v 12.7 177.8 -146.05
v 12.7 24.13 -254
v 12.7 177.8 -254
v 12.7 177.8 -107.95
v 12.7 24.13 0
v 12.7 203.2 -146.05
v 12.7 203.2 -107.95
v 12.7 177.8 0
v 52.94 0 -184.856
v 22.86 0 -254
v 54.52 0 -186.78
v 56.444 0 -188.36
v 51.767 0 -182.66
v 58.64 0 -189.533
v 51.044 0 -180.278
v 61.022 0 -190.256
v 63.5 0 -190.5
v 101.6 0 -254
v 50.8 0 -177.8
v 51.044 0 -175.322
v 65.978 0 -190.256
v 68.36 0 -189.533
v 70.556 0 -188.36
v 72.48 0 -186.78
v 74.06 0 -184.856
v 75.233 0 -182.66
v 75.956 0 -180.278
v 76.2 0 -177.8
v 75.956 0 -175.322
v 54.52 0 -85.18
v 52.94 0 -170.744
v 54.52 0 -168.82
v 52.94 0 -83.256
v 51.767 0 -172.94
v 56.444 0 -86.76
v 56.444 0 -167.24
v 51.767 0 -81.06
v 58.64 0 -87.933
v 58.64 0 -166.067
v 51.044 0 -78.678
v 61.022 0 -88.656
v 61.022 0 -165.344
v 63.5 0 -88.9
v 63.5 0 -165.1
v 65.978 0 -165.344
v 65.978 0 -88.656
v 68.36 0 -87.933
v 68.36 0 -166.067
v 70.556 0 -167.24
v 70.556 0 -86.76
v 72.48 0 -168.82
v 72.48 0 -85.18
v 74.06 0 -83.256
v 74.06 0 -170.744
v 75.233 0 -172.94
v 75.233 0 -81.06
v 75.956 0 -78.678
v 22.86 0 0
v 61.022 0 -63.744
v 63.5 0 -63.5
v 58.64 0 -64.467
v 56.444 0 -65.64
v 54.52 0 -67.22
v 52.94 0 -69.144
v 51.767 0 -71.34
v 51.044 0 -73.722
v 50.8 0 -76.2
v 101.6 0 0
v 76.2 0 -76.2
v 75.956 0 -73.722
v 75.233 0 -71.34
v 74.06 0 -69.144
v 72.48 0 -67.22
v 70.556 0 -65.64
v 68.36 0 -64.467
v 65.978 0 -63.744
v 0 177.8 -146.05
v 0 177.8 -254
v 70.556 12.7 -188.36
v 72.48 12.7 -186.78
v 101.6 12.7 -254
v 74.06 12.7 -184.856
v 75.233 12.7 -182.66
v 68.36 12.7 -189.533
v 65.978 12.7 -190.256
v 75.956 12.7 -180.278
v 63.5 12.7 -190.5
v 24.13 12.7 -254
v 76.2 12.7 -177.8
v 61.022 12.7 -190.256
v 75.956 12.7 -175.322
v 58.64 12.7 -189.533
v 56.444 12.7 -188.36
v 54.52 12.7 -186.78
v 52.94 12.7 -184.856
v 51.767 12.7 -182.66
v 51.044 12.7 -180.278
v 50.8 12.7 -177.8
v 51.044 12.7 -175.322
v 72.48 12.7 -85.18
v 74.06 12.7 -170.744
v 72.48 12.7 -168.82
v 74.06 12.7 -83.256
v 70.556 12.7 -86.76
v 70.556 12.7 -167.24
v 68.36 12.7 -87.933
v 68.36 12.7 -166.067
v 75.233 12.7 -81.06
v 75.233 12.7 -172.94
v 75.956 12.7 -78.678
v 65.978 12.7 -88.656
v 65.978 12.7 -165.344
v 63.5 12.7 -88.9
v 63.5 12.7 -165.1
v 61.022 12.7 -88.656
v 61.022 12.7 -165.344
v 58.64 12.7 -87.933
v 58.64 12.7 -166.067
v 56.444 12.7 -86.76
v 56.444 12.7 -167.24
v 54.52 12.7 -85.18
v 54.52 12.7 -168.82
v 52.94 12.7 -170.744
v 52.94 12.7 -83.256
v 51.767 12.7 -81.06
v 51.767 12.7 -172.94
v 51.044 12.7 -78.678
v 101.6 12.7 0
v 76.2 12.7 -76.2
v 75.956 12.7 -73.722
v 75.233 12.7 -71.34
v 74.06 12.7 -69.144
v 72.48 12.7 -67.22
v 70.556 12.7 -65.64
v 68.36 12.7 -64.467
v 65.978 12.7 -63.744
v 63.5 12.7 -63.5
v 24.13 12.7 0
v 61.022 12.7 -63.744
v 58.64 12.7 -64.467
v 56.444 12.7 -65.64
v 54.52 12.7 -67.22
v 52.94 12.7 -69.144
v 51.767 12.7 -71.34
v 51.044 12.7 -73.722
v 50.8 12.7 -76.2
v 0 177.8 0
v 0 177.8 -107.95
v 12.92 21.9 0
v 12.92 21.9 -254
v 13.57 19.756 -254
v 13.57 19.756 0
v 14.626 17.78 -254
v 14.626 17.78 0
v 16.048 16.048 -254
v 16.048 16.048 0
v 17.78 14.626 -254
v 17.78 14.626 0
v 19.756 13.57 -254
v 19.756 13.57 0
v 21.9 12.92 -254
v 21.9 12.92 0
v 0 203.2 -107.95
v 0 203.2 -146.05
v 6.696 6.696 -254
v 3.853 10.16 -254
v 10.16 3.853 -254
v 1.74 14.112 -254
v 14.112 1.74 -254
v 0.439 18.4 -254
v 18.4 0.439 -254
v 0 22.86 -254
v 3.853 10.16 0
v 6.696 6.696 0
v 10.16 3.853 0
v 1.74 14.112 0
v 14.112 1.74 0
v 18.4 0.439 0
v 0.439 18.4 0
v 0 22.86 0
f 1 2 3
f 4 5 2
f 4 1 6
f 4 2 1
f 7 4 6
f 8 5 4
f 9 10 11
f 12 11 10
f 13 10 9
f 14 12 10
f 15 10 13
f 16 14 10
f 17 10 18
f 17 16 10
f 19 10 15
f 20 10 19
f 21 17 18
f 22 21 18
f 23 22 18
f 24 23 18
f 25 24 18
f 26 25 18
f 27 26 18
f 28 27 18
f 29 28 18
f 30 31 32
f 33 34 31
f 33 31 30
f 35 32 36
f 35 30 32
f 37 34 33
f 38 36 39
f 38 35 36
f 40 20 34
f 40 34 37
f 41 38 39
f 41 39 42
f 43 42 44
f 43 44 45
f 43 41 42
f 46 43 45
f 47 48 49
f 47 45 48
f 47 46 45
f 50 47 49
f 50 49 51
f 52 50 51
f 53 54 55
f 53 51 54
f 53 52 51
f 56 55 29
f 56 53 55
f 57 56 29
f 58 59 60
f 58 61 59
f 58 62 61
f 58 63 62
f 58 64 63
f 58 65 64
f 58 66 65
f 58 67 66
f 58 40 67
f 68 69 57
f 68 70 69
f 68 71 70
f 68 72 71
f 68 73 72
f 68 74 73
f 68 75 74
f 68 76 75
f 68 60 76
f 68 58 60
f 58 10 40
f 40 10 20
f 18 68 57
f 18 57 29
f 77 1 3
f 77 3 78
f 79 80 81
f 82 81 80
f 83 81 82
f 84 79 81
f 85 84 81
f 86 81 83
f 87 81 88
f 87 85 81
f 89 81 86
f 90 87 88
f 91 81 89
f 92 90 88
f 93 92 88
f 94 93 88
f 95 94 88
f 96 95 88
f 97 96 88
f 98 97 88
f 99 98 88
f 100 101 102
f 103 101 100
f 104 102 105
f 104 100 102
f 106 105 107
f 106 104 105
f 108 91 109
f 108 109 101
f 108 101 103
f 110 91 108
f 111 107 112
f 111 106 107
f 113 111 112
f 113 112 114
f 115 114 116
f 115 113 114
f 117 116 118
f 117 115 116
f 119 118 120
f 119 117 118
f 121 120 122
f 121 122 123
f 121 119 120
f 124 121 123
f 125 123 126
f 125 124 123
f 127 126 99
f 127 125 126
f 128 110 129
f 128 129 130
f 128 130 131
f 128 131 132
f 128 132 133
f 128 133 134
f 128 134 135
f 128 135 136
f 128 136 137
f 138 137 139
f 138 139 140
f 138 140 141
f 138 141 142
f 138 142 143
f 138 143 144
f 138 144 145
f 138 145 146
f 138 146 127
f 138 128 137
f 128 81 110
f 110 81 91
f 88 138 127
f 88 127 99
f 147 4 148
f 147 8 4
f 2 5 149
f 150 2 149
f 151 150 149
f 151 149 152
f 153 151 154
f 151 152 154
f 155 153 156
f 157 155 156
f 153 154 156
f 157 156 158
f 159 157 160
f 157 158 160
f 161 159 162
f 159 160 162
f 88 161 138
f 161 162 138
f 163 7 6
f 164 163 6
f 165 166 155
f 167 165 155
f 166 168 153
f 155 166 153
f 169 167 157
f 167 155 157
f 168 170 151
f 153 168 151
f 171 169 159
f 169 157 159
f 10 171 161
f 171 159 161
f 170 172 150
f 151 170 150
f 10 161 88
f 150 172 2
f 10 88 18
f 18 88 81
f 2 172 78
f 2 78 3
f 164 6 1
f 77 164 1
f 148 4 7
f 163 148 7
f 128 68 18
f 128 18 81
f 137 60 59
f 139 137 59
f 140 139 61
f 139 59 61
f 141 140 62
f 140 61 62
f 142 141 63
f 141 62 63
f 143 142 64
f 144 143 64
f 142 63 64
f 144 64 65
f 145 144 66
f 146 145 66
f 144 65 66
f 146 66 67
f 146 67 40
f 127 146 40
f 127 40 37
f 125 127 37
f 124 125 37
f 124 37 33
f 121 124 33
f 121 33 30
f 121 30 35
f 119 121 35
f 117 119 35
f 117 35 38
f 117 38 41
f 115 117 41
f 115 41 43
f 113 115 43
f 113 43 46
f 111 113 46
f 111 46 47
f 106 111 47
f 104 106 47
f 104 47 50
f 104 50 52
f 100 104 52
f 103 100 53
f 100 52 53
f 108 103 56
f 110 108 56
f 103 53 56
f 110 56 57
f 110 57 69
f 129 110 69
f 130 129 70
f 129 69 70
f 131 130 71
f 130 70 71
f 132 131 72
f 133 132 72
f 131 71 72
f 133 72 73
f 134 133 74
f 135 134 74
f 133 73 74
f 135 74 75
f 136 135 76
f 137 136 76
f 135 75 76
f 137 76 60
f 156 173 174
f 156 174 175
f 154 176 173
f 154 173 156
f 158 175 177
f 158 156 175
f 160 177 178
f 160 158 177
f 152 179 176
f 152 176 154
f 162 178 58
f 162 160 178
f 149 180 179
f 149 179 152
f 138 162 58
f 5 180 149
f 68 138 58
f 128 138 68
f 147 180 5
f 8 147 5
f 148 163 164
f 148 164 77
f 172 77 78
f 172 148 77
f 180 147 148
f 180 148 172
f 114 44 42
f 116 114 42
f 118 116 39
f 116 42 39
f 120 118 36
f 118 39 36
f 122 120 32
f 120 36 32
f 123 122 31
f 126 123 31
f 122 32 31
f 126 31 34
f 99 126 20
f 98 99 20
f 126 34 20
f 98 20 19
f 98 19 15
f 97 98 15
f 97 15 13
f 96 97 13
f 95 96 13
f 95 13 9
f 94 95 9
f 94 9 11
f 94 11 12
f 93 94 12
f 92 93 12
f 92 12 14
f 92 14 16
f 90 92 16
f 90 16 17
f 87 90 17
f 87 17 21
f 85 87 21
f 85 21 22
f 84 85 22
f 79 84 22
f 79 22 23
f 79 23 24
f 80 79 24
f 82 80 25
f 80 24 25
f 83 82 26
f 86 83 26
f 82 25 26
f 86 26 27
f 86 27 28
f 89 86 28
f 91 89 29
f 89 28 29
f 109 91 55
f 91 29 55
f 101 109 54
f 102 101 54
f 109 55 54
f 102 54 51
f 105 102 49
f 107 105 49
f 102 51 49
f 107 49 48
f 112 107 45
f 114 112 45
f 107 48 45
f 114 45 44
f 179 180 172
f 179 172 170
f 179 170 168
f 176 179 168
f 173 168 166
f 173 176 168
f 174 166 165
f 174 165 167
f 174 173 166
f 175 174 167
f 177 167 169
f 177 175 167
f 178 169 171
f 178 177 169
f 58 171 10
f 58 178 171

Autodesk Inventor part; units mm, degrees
ref_plane "YZ Plane" through (0, 0, 0) normal (1, 0, 0) x (0, 1, 0)
ref_plane "XZ Plane" through (0, 0, 0) normal (0, 1, 0) x (-1, 0, 0)
ref_plane "XY Plane" through (0, 0, 0) normal (0, 0, 1) x (1, 0, 0)
sketch "Sketch1" plane through (0, 0, 0) normal (0, 0, 1) x (1, 0, 0)
  line L0 (0, 232.5603) -> (0, -22.9879) projected
  line L1 (-15.3679, 0) -> (133.5003, 0) projected
  line L2 (0, 177.8) -> (0, 22.86)
  line L3 (22.86, 0) -> (101.6, 0)
  line L4 (101.6, 0) -> (101.6, 12.7)
  line L5 (101.6, 12.7) -> (24.13, 12.7)
  line L6 (12.7, 24.13) -> (12.7, 177.8)
  line L7 (12.7, 177.8) -> (0, 177.8)
  arc A0 (0, 22.86) -> (22.86, 0) centre (22.86, 22.86) ccw
  arc A1 (12.7, 24.13) -> (24.13, 12.7) centre (24.13, 24.13) ccw
  dimension "d0" = 22.86
  dimension "d1" = 12.7
  dimension "d2" = 177.8
  dimension "d4" = 12.7
  dimension "d6" = 101.6
  dimension "d7" = 11.43
extrude "Extrusion1" add sketch "Sketch1" against normal blind 254 contours L7 L6 A1 L5 L4 L1 A0 L0
sketch "Sketch2" plane through (24.13, 12.7, 0) normal (0, 1, 0) x (1, 0, 0)
  line L0 (77.47, 0) -> (0, 0) projected
  line L1 (77.47, 0) -> (77.47, 254) projected
  point P0 (39.37, 76.2)
  dimension "d10" = 38.1
  dimension "d11" = 76.2
hole "Hole1" at (63.5, 12.7, -76.2) direction (0, -1, 0) diameter 25.4 end through all
pattern_linear "Rectangular Pattern1" count 2 spacing 101.6 along (0, 0, -1) of "Hole1"
sketch "Sketch3" plane through (12.7, 24.13, 0) normal (1, 0, 0) x (0, 0, -1)
  line L0 (0, 153.67) -> (254, 153.67) projected
  line L1 (0, 0) -> (0, 153.67) projected
  line L2 (0, 0) -> (254, 0) projected
  line L3 (107.95, 153.67) -> (107.95, 179.07)
  line L4 (107.95, 179.07) -> (146.05, 179.07)
  line L5 (146.05, 179.07) -> (146.05, 153.67)
  dimension "d22" = 25.4
  dimension "d23" = 38.1
  dimension "d24" = 107.95
extrude "Extrusion2" add sketch "Sketch3" against normal blind 12.7
properties part number "XBRACKET"
